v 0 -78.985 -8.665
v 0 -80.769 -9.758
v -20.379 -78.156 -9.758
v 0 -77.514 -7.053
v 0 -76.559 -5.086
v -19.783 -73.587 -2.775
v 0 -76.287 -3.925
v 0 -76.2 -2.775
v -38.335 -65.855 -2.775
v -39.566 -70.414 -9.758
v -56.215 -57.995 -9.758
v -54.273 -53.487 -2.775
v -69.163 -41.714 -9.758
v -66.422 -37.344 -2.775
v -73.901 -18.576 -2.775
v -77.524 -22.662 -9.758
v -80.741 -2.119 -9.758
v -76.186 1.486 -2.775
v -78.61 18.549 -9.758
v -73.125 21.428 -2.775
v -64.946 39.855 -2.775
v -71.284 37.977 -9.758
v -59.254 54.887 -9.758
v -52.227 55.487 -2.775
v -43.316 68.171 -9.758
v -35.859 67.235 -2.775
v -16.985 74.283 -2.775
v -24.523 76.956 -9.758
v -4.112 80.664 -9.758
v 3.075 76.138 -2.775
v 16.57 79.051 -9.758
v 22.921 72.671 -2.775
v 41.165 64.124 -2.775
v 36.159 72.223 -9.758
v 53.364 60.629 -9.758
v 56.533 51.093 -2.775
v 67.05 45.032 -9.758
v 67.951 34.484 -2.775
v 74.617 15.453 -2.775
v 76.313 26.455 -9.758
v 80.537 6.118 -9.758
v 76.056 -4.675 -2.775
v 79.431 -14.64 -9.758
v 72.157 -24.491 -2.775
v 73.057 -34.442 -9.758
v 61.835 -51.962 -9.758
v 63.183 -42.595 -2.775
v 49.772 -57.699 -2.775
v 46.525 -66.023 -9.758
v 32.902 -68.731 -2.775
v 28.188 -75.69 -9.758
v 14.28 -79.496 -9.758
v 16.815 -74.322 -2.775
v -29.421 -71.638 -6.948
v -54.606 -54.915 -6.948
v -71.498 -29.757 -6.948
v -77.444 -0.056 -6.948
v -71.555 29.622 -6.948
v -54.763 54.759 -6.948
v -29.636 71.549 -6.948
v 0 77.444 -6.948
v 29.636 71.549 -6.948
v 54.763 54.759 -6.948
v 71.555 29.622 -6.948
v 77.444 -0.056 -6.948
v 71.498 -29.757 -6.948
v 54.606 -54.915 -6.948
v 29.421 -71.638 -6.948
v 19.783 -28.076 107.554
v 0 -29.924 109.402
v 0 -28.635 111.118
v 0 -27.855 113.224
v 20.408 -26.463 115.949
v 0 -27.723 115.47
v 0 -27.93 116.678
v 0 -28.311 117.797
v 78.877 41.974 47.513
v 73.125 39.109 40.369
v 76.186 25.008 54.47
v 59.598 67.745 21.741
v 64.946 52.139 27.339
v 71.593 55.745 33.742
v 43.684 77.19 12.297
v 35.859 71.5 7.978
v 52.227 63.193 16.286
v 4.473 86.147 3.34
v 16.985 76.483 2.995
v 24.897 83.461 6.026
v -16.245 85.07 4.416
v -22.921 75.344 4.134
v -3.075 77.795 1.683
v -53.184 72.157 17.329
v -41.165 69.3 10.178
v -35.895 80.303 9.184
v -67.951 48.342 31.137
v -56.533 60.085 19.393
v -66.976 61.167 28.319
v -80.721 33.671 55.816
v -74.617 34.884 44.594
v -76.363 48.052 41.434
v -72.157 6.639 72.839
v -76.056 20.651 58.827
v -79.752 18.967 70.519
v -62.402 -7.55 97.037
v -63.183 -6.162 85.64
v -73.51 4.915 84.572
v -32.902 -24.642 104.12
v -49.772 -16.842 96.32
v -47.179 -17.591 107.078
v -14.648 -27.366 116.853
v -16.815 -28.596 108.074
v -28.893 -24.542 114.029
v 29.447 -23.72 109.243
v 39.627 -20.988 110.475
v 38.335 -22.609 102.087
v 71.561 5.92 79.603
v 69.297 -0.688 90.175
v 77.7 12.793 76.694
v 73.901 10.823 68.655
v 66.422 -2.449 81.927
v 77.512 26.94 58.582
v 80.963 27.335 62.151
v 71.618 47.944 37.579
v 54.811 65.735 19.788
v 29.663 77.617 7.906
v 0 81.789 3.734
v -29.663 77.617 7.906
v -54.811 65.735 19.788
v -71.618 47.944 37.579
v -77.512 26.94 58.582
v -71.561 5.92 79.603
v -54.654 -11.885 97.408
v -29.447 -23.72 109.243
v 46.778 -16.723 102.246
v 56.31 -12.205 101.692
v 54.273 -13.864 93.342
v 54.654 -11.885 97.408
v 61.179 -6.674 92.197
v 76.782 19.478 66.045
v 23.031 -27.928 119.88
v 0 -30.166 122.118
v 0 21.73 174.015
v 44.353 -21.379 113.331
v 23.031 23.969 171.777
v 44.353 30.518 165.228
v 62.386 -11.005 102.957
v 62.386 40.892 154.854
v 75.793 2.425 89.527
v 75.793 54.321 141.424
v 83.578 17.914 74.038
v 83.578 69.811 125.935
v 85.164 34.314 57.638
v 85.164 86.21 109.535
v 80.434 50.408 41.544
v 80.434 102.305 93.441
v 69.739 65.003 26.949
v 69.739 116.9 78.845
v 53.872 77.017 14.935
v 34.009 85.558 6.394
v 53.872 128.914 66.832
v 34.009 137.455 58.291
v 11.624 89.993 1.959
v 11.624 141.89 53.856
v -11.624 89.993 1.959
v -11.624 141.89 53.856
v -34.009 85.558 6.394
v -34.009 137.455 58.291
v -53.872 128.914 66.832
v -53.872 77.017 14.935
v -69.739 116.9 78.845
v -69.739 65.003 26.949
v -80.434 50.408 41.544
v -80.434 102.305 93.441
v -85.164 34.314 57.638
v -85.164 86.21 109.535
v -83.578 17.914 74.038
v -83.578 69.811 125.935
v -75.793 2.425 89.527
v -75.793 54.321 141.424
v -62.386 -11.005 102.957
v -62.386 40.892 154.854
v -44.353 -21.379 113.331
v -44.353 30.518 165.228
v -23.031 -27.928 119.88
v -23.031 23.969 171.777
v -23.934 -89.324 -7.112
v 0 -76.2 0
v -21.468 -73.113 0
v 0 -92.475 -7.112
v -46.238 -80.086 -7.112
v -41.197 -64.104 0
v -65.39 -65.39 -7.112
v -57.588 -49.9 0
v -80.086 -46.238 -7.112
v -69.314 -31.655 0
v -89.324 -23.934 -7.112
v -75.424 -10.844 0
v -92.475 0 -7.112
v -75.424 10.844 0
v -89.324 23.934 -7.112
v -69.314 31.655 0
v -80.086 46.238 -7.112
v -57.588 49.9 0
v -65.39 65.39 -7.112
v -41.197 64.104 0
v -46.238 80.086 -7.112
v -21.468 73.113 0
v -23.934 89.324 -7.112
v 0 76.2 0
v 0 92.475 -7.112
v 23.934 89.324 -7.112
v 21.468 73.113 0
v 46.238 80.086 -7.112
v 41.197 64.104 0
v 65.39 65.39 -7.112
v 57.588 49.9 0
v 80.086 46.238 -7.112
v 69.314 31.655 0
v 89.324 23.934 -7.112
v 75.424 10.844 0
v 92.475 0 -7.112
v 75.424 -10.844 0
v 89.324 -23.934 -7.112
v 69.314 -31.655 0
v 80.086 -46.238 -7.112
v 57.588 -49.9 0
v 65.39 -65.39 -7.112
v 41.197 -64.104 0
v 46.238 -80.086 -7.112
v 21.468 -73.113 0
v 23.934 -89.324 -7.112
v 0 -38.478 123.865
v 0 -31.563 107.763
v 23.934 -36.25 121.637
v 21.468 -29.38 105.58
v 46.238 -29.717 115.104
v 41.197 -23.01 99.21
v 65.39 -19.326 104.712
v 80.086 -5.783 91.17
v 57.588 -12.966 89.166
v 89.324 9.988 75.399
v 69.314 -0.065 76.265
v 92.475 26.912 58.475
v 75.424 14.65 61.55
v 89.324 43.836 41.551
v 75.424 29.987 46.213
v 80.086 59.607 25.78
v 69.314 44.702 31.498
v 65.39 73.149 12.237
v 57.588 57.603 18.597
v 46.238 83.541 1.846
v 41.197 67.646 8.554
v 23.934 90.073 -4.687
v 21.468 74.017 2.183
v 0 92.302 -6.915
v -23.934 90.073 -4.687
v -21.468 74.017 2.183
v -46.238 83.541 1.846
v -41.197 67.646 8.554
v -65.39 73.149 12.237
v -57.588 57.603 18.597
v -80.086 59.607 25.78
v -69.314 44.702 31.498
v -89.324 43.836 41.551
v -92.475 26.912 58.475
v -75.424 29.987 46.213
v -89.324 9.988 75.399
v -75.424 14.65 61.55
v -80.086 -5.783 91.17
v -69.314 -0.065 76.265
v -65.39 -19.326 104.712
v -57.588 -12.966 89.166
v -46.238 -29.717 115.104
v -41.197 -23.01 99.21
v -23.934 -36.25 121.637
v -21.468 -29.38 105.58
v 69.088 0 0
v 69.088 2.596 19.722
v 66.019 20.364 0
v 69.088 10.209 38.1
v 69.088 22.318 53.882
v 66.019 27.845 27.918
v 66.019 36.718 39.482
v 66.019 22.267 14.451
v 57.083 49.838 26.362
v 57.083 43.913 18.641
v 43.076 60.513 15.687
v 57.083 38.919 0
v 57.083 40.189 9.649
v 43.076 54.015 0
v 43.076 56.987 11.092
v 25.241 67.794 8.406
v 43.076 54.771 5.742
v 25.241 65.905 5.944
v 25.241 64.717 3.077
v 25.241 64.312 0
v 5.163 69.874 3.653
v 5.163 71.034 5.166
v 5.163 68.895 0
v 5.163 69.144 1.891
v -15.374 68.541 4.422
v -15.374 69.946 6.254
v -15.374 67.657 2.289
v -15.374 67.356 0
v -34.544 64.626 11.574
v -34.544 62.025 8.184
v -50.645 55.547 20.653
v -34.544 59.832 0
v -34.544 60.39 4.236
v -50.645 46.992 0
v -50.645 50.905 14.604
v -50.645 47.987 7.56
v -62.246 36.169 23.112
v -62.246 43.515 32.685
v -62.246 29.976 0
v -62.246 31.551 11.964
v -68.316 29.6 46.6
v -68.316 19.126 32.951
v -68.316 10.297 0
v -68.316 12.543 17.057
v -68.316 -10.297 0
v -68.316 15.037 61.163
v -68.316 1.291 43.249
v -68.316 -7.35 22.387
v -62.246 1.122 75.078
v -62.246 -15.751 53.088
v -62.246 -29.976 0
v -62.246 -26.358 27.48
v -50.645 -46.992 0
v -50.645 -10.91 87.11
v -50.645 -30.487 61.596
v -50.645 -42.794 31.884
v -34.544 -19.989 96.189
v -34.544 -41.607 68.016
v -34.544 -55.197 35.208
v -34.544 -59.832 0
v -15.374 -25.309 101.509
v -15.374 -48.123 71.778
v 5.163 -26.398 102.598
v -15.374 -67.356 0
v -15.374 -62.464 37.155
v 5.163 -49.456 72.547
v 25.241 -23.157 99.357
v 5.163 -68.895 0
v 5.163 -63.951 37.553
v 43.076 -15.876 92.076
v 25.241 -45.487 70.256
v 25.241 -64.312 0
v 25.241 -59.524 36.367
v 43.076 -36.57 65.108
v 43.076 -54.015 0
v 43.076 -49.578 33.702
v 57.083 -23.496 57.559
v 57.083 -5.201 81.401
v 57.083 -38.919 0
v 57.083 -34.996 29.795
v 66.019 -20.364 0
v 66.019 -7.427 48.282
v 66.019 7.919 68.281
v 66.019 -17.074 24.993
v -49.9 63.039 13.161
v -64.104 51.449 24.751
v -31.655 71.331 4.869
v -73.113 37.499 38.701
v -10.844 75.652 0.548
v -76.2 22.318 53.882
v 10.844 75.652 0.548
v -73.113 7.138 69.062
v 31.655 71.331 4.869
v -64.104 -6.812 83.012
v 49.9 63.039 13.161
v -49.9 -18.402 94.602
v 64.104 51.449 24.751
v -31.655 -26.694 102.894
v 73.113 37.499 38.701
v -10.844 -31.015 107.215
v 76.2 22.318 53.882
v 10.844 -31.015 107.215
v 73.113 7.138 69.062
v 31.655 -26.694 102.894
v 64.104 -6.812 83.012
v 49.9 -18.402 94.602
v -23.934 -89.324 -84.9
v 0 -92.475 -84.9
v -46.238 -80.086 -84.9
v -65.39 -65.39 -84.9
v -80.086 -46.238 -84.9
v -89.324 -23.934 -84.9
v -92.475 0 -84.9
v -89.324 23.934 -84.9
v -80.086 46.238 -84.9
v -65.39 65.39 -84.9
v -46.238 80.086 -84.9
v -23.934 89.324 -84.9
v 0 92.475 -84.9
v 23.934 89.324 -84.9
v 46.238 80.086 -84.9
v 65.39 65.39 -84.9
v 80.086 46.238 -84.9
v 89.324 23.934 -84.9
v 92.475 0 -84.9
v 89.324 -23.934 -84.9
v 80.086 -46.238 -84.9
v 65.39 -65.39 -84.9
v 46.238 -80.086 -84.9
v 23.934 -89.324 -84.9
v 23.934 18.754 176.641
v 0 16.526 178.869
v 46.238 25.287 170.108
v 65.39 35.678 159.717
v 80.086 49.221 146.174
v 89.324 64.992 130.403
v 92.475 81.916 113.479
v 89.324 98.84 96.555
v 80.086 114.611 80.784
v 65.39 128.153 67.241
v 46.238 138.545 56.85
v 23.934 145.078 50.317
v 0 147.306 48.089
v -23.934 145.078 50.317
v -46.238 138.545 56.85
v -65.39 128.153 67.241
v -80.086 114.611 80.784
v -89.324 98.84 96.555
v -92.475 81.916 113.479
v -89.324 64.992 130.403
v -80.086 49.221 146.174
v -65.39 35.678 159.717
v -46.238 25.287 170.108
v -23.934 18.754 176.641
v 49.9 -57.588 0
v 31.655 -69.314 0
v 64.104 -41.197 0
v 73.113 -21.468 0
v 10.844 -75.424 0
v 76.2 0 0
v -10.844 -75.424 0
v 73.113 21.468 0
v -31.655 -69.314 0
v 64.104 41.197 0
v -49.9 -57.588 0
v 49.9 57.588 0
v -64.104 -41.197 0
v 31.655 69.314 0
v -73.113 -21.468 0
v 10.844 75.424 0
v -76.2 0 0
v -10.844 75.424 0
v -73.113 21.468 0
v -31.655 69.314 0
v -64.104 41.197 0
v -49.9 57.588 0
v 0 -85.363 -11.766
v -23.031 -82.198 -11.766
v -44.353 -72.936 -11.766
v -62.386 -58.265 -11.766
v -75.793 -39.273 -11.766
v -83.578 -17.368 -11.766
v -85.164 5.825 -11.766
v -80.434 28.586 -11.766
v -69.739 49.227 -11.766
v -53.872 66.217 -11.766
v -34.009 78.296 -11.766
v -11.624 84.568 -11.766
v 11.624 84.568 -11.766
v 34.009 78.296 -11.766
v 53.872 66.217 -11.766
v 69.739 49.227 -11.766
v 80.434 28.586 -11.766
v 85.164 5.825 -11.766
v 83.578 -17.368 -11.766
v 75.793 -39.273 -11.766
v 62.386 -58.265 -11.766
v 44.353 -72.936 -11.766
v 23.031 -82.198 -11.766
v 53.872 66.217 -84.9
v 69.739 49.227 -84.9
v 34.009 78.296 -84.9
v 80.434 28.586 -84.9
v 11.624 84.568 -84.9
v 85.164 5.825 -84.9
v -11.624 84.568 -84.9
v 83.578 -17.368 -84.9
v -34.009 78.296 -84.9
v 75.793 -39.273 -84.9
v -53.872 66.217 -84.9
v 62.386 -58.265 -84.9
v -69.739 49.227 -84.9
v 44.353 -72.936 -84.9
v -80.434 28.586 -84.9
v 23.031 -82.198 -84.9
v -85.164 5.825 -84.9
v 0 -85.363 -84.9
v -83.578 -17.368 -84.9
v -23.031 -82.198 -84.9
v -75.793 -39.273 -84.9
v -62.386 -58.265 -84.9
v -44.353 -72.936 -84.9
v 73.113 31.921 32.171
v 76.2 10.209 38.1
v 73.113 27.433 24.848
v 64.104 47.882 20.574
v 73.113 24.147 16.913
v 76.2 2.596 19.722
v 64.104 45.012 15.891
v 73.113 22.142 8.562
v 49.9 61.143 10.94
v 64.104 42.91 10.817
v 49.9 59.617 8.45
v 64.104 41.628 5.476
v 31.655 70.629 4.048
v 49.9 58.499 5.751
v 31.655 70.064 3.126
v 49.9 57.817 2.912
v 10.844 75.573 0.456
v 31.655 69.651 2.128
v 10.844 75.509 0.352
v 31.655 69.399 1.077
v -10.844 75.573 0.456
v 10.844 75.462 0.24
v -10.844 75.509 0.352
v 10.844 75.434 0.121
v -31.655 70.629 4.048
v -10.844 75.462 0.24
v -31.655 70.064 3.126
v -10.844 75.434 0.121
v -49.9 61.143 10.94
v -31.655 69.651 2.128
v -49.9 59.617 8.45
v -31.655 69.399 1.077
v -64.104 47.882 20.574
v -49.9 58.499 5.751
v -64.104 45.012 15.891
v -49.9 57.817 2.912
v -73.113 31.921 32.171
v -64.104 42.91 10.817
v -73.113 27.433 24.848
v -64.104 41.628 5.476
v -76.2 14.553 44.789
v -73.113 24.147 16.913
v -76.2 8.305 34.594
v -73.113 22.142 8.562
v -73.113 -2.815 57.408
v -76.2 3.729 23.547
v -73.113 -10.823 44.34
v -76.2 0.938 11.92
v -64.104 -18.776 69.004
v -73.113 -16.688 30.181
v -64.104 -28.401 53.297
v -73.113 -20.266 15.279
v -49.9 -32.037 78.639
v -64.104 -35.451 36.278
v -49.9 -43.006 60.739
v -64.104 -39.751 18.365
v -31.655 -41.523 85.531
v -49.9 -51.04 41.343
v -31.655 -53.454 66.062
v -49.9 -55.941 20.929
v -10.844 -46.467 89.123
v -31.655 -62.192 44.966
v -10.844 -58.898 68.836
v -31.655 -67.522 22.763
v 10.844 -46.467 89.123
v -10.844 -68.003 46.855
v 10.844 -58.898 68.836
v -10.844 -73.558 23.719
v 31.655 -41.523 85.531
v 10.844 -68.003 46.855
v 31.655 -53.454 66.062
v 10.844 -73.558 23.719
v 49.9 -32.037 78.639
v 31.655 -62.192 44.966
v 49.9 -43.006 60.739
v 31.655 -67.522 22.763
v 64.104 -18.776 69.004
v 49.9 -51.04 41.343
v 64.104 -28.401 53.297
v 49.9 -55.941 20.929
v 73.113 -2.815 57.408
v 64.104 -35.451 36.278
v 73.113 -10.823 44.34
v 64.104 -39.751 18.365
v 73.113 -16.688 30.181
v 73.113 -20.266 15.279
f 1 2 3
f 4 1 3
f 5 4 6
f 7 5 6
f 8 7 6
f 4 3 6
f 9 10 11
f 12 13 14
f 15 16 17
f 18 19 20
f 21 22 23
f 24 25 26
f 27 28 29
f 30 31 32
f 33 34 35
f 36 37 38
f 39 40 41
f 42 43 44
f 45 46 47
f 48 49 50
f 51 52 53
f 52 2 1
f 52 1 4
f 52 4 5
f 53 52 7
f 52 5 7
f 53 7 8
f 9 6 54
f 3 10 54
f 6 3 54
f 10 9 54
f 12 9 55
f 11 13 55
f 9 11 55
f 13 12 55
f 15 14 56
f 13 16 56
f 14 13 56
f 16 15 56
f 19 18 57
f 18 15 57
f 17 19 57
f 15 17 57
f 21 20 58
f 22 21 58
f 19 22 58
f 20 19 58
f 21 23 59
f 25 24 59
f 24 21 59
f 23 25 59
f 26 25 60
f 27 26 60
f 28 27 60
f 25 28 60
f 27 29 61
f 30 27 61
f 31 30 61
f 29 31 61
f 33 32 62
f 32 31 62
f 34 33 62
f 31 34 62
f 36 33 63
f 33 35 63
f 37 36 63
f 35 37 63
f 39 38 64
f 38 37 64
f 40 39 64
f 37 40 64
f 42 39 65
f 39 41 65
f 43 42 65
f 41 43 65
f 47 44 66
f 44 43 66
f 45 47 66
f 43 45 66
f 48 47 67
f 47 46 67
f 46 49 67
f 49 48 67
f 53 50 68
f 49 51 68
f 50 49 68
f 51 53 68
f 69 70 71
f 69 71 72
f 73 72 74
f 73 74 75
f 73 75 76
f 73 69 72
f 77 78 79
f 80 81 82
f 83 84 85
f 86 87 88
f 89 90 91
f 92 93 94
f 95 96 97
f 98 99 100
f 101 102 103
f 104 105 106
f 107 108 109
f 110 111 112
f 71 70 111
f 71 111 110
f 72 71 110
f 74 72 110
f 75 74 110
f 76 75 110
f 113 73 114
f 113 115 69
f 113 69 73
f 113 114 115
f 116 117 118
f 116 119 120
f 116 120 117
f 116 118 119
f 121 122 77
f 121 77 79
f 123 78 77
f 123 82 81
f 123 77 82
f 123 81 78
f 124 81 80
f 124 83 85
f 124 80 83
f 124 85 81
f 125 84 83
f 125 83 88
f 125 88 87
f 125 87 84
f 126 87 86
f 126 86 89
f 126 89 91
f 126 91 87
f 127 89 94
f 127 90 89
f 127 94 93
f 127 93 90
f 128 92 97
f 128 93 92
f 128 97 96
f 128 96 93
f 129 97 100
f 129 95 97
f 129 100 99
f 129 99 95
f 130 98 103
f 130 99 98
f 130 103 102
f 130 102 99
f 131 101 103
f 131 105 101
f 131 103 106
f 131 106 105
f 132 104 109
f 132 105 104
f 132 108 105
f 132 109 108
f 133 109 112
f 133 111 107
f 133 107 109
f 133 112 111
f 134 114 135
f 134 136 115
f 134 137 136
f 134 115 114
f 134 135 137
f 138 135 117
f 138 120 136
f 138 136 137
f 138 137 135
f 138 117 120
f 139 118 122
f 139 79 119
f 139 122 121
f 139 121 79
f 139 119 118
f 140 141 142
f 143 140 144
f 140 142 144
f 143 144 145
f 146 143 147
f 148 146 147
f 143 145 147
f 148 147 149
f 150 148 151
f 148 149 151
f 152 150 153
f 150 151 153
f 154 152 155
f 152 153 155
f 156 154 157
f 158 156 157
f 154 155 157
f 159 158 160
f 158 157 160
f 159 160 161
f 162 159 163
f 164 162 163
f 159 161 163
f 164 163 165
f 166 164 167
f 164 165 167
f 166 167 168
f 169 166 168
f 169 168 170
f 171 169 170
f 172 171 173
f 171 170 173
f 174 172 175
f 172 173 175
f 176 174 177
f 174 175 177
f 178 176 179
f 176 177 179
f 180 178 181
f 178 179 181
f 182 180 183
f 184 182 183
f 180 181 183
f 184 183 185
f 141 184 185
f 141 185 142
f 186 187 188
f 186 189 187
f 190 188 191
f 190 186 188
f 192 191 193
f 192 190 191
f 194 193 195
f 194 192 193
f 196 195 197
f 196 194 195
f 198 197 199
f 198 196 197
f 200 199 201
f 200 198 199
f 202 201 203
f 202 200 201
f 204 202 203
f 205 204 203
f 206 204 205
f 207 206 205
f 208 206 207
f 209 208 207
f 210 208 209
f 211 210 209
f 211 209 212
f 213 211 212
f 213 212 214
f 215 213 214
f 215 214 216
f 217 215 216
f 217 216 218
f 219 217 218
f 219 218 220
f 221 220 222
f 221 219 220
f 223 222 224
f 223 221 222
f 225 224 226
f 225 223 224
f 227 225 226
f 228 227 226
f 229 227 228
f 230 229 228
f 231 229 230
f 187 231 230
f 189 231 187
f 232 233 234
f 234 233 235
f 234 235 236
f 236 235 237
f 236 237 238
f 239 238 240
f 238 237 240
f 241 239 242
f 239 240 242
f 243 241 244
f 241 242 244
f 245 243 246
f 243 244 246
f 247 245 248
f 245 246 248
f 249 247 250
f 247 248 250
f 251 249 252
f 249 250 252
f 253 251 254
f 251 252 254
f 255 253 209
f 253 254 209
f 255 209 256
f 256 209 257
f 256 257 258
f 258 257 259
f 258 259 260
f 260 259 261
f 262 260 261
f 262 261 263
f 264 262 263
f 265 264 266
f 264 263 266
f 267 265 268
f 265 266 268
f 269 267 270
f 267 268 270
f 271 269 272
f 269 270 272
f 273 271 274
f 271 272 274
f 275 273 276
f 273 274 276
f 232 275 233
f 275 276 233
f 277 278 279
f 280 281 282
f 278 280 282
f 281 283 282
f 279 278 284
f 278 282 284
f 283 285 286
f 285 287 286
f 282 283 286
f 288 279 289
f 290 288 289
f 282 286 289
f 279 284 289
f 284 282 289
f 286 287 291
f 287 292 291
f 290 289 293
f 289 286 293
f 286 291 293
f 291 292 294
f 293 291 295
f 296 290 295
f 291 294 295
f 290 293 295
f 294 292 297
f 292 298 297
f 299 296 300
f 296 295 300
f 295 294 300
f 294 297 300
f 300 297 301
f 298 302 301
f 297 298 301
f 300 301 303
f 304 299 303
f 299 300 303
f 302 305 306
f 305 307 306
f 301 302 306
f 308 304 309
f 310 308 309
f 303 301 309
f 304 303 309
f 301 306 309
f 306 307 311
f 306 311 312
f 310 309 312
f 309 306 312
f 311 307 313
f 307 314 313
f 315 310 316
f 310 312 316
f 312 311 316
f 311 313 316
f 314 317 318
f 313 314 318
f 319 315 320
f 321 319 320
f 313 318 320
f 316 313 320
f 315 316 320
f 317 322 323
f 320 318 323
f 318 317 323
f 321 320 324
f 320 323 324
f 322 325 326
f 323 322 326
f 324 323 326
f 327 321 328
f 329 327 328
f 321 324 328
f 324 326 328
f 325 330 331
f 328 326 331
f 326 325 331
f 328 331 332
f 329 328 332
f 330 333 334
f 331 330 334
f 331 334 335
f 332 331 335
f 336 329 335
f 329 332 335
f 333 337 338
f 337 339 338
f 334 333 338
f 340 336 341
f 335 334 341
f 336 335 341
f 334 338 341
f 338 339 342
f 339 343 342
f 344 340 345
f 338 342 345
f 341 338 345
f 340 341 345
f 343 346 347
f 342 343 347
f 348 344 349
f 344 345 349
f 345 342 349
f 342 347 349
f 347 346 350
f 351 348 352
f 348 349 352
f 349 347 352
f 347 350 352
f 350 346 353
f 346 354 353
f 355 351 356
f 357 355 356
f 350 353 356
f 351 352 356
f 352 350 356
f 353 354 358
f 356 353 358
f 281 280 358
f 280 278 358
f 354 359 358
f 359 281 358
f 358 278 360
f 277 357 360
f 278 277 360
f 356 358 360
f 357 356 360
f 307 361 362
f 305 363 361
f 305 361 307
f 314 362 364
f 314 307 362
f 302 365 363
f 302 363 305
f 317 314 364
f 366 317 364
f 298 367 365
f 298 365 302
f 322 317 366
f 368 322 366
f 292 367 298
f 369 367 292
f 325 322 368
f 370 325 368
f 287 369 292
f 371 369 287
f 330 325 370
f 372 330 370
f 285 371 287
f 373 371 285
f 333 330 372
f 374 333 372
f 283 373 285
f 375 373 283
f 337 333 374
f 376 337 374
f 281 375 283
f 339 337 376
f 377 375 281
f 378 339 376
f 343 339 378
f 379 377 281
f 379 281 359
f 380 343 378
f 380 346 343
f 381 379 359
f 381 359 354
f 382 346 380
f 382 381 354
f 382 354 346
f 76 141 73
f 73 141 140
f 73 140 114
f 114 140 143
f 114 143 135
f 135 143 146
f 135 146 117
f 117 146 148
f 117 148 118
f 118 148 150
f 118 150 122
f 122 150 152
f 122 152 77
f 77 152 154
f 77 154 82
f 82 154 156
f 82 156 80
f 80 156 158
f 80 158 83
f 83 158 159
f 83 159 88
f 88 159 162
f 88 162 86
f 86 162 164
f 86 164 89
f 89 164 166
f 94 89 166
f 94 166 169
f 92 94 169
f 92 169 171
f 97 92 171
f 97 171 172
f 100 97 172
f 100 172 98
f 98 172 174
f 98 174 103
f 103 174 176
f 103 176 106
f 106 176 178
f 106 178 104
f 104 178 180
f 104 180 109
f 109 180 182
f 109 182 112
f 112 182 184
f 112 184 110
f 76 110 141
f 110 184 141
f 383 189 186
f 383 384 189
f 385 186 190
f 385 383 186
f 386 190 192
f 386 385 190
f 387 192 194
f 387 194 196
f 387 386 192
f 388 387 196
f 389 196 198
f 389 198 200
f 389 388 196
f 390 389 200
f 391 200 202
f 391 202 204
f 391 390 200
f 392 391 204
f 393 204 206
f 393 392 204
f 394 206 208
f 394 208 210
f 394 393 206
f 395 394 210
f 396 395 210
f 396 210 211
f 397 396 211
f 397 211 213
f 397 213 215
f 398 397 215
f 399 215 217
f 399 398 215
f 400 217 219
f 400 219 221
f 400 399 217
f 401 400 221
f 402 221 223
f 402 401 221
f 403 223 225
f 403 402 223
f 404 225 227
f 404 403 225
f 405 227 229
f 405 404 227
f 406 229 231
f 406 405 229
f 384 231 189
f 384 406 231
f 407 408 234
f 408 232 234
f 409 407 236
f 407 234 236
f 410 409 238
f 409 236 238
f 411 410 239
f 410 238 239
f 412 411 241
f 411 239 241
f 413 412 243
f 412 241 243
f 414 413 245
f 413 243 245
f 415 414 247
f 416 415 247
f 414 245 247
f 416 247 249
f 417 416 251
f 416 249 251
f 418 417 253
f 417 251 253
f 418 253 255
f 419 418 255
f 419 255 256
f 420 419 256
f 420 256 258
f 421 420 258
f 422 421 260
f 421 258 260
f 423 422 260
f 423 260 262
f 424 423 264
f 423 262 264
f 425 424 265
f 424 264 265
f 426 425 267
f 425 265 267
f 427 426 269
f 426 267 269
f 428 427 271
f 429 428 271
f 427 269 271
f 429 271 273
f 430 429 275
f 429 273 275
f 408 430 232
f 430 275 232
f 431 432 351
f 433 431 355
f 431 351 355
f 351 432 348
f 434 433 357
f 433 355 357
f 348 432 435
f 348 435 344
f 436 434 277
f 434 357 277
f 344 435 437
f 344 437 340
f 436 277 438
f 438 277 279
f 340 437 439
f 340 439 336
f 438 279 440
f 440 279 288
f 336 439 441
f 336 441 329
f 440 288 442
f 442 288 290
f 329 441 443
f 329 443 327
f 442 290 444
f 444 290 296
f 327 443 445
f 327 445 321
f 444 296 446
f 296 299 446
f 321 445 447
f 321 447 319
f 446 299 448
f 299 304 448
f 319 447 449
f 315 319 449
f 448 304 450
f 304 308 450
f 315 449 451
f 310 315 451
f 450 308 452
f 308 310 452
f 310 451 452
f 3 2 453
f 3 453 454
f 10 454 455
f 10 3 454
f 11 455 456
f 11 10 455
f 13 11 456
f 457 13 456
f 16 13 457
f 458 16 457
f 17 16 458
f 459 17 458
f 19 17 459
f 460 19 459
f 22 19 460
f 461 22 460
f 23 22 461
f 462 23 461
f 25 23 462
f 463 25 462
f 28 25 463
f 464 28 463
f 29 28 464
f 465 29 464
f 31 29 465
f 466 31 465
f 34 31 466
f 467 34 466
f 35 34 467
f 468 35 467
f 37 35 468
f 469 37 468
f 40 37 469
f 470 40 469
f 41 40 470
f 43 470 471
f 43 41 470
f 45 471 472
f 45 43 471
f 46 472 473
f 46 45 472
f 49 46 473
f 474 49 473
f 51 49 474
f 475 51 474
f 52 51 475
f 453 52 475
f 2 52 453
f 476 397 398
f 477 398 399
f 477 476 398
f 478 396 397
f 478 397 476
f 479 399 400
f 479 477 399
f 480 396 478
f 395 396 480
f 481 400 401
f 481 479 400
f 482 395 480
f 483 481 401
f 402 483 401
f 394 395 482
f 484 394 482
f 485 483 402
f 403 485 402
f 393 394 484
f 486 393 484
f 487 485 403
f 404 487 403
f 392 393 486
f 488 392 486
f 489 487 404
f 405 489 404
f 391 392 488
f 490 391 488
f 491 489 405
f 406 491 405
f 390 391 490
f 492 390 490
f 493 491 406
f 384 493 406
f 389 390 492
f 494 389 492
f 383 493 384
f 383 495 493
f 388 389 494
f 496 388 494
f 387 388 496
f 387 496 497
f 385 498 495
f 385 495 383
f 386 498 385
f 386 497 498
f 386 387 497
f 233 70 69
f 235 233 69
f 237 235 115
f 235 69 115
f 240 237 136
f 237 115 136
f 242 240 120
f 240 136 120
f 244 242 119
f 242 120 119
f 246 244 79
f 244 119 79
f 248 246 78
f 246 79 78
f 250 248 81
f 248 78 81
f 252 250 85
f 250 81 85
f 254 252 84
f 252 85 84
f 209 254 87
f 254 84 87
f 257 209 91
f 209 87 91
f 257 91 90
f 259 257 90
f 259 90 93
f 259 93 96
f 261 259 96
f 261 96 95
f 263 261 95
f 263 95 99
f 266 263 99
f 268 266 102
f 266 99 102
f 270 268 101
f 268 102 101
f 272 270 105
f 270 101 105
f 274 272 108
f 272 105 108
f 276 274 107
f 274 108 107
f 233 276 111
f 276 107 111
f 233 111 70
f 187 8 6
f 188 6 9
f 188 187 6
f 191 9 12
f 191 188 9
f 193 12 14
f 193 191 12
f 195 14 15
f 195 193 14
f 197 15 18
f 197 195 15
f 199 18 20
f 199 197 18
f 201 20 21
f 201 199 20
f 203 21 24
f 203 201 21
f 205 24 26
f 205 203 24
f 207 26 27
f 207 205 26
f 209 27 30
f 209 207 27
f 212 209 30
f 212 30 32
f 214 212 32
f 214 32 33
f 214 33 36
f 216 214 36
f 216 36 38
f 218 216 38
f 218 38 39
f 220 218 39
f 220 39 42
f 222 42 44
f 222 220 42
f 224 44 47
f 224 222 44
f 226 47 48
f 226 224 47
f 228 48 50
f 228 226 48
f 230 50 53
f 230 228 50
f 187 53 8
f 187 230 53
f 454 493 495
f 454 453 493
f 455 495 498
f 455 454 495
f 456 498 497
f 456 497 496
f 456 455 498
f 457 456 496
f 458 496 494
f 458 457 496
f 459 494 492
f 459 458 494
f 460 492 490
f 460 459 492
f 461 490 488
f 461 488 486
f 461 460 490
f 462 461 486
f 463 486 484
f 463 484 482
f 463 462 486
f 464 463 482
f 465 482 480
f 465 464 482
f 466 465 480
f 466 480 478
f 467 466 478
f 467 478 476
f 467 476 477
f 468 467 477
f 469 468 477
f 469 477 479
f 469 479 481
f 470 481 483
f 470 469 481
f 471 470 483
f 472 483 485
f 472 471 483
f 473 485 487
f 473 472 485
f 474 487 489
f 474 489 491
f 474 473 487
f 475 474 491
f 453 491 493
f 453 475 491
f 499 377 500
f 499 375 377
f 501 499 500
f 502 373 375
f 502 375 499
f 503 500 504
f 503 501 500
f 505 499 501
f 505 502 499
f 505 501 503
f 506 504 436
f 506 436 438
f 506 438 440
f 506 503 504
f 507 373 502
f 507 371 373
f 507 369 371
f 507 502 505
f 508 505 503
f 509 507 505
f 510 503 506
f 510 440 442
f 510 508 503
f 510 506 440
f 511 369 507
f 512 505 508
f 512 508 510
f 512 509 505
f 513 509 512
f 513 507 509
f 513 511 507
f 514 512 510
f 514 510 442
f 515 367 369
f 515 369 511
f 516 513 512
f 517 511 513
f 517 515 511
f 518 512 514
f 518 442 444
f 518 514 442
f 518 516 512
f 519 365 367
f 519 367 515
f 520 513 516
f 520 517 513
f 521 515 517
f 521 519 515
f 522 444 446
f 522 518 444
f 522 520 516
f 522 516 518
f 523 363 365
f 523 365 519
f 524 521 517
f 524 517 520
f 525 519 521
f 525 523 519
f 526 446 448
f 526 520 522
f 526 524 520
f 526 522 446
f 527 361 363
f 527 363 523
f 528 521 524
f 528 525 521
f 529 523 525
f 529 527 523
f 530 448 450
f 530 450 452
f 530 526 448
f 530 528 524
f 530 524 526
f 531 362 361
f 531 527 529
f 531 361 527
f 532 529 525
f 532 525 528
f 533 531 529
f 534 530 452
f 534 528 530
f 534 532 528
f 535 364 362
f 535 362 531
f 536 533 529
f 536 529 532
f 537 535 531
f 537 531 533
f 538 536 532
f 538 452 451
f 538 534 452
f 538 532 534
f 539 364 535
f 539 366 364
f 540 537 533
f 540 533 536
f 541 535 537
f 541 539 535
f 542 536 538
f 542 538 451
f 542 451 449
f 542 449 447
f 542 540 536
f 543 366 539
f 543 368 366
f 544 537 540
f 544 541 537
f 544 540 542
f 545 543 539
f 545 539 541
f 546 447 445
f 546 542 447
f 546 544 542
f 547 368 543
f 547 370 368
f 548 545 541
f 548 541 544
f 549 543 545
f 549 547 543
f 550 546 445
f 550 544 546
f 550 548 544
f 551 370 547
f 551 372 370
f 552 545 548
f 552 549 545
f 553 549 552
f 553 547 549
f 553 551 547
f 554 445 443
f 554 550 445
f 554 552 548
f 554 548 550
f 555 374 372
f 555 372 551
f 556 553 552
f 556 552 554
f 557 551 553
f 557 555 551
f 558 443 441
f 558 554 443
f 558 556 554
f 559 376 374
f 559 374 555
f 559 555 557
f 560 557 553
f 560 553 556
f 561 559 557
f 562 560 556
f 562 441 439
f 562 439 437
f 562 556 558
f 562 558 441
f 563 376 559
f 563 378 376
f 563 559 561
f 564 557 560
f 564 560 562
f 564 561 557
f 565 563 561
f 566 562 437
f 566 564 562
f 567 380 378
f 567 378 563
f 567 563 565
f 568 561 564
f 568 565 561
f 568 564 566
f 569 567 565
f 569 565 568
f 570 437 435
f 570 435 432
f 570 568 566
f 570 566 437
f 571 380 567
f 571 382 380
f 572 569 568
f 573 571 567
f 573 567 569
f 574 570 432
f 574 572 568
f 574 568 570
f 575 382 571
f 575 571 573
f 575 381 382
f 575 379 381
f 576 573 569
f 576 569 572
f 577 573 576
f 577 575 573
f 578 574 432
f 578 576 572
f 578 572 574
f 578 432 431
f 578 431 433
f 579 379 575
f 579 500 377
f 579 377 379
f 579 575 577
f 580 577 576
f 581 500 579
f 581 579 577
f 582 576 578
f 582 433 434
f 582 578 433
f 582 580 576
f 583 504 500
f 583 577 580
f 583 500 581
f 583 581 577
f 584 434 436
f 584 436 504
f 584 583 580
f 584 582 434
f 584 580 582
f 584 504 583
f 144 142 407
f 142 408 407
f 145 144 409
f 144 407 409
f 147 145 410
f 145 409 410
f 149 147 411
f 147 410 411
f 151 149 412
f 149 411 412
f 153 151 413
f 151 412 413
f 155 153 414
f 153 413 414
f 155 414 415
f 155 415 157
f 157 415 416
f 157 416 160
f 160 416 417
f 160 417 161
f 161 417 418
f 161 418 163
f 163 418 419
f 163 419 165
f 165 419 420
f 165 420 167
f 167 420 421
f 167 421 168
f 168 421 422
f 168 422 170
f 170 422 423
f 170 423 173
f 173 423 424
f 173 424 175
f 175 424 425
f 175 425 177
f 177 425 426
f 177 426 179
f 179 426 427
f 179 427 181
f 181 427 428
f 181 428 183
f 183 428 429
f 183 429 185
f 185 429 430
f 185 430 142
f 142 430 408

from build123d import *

# Parameters (mm, degrees)
F1_R   = 76.2
F1_R_2 = 69.088
F7_R   = 7.62
F8_R   = 7.62


with BuildPart() as f4:
    # F0 (on Right) → F4 (revolve)
    with BuildSketch(Plane.YZ):
        Polygon((-76.2, 0), (-92.47505, -7.112), (-92.47505, -84.8995), (-85.36305, -84.8995), (-85.36305, -11.7655417155), (-76.2, -7.7613996945), align=None)
    revolve(axis=Axis((0, 0, -46.00575), (0, 0, -1)))

    # F8
    f8_edges = [f4.edges().sort_by_distance(p)[0] for p in [
        (0, 76.2, -7.7614),
    ]]
    fillet(f8_edges, radius=F8_R)


with BuildPart() as f5:
    # F5: sweep along a path in F2
    with BuildLine(Plane.YZ) as f5_path:
        ThreePointArc((22.3184632736, 53.8815367264), (5.8003796226, 29.1604775462), (0, 0))
    # F1 (on Top) → F5 (sweep)
    with BuildSketch(Plane.XY):
        Circle(F1_R)
        Circle(F1_R_2, mode=Mode.SUBTRACT)
    sweep(path=f5_path.line)


with BuildPart() as f6:
    # F3 (on Right) → F6 (revolve)
    with BuildSketch(Plane.YZ):
        Polygon((16.5261881161, 178.8687314601), (-38.4778806255, 123.8646627185), (-31.5630734528, 107.7630734528), (-26.2731860569, 113.0529608487), (-30.1663061311, 122.1183503573), (21.7304941317, 174.0151506201), align=None)
    revolve(axis=Axis((0, 54.8494410722, 86.412514525), (0, 0.7071067812, 0.7071067812)))

    # F7
    f7_edges = [f6.edges().sort_by_distance(p)[0] for p in [
        (0, 81.489887, 5.289887),
    ]]
    fillet(f7_edges, radius=F7_R)


solid = Compound([f4.part, f5.part, f6.part])
